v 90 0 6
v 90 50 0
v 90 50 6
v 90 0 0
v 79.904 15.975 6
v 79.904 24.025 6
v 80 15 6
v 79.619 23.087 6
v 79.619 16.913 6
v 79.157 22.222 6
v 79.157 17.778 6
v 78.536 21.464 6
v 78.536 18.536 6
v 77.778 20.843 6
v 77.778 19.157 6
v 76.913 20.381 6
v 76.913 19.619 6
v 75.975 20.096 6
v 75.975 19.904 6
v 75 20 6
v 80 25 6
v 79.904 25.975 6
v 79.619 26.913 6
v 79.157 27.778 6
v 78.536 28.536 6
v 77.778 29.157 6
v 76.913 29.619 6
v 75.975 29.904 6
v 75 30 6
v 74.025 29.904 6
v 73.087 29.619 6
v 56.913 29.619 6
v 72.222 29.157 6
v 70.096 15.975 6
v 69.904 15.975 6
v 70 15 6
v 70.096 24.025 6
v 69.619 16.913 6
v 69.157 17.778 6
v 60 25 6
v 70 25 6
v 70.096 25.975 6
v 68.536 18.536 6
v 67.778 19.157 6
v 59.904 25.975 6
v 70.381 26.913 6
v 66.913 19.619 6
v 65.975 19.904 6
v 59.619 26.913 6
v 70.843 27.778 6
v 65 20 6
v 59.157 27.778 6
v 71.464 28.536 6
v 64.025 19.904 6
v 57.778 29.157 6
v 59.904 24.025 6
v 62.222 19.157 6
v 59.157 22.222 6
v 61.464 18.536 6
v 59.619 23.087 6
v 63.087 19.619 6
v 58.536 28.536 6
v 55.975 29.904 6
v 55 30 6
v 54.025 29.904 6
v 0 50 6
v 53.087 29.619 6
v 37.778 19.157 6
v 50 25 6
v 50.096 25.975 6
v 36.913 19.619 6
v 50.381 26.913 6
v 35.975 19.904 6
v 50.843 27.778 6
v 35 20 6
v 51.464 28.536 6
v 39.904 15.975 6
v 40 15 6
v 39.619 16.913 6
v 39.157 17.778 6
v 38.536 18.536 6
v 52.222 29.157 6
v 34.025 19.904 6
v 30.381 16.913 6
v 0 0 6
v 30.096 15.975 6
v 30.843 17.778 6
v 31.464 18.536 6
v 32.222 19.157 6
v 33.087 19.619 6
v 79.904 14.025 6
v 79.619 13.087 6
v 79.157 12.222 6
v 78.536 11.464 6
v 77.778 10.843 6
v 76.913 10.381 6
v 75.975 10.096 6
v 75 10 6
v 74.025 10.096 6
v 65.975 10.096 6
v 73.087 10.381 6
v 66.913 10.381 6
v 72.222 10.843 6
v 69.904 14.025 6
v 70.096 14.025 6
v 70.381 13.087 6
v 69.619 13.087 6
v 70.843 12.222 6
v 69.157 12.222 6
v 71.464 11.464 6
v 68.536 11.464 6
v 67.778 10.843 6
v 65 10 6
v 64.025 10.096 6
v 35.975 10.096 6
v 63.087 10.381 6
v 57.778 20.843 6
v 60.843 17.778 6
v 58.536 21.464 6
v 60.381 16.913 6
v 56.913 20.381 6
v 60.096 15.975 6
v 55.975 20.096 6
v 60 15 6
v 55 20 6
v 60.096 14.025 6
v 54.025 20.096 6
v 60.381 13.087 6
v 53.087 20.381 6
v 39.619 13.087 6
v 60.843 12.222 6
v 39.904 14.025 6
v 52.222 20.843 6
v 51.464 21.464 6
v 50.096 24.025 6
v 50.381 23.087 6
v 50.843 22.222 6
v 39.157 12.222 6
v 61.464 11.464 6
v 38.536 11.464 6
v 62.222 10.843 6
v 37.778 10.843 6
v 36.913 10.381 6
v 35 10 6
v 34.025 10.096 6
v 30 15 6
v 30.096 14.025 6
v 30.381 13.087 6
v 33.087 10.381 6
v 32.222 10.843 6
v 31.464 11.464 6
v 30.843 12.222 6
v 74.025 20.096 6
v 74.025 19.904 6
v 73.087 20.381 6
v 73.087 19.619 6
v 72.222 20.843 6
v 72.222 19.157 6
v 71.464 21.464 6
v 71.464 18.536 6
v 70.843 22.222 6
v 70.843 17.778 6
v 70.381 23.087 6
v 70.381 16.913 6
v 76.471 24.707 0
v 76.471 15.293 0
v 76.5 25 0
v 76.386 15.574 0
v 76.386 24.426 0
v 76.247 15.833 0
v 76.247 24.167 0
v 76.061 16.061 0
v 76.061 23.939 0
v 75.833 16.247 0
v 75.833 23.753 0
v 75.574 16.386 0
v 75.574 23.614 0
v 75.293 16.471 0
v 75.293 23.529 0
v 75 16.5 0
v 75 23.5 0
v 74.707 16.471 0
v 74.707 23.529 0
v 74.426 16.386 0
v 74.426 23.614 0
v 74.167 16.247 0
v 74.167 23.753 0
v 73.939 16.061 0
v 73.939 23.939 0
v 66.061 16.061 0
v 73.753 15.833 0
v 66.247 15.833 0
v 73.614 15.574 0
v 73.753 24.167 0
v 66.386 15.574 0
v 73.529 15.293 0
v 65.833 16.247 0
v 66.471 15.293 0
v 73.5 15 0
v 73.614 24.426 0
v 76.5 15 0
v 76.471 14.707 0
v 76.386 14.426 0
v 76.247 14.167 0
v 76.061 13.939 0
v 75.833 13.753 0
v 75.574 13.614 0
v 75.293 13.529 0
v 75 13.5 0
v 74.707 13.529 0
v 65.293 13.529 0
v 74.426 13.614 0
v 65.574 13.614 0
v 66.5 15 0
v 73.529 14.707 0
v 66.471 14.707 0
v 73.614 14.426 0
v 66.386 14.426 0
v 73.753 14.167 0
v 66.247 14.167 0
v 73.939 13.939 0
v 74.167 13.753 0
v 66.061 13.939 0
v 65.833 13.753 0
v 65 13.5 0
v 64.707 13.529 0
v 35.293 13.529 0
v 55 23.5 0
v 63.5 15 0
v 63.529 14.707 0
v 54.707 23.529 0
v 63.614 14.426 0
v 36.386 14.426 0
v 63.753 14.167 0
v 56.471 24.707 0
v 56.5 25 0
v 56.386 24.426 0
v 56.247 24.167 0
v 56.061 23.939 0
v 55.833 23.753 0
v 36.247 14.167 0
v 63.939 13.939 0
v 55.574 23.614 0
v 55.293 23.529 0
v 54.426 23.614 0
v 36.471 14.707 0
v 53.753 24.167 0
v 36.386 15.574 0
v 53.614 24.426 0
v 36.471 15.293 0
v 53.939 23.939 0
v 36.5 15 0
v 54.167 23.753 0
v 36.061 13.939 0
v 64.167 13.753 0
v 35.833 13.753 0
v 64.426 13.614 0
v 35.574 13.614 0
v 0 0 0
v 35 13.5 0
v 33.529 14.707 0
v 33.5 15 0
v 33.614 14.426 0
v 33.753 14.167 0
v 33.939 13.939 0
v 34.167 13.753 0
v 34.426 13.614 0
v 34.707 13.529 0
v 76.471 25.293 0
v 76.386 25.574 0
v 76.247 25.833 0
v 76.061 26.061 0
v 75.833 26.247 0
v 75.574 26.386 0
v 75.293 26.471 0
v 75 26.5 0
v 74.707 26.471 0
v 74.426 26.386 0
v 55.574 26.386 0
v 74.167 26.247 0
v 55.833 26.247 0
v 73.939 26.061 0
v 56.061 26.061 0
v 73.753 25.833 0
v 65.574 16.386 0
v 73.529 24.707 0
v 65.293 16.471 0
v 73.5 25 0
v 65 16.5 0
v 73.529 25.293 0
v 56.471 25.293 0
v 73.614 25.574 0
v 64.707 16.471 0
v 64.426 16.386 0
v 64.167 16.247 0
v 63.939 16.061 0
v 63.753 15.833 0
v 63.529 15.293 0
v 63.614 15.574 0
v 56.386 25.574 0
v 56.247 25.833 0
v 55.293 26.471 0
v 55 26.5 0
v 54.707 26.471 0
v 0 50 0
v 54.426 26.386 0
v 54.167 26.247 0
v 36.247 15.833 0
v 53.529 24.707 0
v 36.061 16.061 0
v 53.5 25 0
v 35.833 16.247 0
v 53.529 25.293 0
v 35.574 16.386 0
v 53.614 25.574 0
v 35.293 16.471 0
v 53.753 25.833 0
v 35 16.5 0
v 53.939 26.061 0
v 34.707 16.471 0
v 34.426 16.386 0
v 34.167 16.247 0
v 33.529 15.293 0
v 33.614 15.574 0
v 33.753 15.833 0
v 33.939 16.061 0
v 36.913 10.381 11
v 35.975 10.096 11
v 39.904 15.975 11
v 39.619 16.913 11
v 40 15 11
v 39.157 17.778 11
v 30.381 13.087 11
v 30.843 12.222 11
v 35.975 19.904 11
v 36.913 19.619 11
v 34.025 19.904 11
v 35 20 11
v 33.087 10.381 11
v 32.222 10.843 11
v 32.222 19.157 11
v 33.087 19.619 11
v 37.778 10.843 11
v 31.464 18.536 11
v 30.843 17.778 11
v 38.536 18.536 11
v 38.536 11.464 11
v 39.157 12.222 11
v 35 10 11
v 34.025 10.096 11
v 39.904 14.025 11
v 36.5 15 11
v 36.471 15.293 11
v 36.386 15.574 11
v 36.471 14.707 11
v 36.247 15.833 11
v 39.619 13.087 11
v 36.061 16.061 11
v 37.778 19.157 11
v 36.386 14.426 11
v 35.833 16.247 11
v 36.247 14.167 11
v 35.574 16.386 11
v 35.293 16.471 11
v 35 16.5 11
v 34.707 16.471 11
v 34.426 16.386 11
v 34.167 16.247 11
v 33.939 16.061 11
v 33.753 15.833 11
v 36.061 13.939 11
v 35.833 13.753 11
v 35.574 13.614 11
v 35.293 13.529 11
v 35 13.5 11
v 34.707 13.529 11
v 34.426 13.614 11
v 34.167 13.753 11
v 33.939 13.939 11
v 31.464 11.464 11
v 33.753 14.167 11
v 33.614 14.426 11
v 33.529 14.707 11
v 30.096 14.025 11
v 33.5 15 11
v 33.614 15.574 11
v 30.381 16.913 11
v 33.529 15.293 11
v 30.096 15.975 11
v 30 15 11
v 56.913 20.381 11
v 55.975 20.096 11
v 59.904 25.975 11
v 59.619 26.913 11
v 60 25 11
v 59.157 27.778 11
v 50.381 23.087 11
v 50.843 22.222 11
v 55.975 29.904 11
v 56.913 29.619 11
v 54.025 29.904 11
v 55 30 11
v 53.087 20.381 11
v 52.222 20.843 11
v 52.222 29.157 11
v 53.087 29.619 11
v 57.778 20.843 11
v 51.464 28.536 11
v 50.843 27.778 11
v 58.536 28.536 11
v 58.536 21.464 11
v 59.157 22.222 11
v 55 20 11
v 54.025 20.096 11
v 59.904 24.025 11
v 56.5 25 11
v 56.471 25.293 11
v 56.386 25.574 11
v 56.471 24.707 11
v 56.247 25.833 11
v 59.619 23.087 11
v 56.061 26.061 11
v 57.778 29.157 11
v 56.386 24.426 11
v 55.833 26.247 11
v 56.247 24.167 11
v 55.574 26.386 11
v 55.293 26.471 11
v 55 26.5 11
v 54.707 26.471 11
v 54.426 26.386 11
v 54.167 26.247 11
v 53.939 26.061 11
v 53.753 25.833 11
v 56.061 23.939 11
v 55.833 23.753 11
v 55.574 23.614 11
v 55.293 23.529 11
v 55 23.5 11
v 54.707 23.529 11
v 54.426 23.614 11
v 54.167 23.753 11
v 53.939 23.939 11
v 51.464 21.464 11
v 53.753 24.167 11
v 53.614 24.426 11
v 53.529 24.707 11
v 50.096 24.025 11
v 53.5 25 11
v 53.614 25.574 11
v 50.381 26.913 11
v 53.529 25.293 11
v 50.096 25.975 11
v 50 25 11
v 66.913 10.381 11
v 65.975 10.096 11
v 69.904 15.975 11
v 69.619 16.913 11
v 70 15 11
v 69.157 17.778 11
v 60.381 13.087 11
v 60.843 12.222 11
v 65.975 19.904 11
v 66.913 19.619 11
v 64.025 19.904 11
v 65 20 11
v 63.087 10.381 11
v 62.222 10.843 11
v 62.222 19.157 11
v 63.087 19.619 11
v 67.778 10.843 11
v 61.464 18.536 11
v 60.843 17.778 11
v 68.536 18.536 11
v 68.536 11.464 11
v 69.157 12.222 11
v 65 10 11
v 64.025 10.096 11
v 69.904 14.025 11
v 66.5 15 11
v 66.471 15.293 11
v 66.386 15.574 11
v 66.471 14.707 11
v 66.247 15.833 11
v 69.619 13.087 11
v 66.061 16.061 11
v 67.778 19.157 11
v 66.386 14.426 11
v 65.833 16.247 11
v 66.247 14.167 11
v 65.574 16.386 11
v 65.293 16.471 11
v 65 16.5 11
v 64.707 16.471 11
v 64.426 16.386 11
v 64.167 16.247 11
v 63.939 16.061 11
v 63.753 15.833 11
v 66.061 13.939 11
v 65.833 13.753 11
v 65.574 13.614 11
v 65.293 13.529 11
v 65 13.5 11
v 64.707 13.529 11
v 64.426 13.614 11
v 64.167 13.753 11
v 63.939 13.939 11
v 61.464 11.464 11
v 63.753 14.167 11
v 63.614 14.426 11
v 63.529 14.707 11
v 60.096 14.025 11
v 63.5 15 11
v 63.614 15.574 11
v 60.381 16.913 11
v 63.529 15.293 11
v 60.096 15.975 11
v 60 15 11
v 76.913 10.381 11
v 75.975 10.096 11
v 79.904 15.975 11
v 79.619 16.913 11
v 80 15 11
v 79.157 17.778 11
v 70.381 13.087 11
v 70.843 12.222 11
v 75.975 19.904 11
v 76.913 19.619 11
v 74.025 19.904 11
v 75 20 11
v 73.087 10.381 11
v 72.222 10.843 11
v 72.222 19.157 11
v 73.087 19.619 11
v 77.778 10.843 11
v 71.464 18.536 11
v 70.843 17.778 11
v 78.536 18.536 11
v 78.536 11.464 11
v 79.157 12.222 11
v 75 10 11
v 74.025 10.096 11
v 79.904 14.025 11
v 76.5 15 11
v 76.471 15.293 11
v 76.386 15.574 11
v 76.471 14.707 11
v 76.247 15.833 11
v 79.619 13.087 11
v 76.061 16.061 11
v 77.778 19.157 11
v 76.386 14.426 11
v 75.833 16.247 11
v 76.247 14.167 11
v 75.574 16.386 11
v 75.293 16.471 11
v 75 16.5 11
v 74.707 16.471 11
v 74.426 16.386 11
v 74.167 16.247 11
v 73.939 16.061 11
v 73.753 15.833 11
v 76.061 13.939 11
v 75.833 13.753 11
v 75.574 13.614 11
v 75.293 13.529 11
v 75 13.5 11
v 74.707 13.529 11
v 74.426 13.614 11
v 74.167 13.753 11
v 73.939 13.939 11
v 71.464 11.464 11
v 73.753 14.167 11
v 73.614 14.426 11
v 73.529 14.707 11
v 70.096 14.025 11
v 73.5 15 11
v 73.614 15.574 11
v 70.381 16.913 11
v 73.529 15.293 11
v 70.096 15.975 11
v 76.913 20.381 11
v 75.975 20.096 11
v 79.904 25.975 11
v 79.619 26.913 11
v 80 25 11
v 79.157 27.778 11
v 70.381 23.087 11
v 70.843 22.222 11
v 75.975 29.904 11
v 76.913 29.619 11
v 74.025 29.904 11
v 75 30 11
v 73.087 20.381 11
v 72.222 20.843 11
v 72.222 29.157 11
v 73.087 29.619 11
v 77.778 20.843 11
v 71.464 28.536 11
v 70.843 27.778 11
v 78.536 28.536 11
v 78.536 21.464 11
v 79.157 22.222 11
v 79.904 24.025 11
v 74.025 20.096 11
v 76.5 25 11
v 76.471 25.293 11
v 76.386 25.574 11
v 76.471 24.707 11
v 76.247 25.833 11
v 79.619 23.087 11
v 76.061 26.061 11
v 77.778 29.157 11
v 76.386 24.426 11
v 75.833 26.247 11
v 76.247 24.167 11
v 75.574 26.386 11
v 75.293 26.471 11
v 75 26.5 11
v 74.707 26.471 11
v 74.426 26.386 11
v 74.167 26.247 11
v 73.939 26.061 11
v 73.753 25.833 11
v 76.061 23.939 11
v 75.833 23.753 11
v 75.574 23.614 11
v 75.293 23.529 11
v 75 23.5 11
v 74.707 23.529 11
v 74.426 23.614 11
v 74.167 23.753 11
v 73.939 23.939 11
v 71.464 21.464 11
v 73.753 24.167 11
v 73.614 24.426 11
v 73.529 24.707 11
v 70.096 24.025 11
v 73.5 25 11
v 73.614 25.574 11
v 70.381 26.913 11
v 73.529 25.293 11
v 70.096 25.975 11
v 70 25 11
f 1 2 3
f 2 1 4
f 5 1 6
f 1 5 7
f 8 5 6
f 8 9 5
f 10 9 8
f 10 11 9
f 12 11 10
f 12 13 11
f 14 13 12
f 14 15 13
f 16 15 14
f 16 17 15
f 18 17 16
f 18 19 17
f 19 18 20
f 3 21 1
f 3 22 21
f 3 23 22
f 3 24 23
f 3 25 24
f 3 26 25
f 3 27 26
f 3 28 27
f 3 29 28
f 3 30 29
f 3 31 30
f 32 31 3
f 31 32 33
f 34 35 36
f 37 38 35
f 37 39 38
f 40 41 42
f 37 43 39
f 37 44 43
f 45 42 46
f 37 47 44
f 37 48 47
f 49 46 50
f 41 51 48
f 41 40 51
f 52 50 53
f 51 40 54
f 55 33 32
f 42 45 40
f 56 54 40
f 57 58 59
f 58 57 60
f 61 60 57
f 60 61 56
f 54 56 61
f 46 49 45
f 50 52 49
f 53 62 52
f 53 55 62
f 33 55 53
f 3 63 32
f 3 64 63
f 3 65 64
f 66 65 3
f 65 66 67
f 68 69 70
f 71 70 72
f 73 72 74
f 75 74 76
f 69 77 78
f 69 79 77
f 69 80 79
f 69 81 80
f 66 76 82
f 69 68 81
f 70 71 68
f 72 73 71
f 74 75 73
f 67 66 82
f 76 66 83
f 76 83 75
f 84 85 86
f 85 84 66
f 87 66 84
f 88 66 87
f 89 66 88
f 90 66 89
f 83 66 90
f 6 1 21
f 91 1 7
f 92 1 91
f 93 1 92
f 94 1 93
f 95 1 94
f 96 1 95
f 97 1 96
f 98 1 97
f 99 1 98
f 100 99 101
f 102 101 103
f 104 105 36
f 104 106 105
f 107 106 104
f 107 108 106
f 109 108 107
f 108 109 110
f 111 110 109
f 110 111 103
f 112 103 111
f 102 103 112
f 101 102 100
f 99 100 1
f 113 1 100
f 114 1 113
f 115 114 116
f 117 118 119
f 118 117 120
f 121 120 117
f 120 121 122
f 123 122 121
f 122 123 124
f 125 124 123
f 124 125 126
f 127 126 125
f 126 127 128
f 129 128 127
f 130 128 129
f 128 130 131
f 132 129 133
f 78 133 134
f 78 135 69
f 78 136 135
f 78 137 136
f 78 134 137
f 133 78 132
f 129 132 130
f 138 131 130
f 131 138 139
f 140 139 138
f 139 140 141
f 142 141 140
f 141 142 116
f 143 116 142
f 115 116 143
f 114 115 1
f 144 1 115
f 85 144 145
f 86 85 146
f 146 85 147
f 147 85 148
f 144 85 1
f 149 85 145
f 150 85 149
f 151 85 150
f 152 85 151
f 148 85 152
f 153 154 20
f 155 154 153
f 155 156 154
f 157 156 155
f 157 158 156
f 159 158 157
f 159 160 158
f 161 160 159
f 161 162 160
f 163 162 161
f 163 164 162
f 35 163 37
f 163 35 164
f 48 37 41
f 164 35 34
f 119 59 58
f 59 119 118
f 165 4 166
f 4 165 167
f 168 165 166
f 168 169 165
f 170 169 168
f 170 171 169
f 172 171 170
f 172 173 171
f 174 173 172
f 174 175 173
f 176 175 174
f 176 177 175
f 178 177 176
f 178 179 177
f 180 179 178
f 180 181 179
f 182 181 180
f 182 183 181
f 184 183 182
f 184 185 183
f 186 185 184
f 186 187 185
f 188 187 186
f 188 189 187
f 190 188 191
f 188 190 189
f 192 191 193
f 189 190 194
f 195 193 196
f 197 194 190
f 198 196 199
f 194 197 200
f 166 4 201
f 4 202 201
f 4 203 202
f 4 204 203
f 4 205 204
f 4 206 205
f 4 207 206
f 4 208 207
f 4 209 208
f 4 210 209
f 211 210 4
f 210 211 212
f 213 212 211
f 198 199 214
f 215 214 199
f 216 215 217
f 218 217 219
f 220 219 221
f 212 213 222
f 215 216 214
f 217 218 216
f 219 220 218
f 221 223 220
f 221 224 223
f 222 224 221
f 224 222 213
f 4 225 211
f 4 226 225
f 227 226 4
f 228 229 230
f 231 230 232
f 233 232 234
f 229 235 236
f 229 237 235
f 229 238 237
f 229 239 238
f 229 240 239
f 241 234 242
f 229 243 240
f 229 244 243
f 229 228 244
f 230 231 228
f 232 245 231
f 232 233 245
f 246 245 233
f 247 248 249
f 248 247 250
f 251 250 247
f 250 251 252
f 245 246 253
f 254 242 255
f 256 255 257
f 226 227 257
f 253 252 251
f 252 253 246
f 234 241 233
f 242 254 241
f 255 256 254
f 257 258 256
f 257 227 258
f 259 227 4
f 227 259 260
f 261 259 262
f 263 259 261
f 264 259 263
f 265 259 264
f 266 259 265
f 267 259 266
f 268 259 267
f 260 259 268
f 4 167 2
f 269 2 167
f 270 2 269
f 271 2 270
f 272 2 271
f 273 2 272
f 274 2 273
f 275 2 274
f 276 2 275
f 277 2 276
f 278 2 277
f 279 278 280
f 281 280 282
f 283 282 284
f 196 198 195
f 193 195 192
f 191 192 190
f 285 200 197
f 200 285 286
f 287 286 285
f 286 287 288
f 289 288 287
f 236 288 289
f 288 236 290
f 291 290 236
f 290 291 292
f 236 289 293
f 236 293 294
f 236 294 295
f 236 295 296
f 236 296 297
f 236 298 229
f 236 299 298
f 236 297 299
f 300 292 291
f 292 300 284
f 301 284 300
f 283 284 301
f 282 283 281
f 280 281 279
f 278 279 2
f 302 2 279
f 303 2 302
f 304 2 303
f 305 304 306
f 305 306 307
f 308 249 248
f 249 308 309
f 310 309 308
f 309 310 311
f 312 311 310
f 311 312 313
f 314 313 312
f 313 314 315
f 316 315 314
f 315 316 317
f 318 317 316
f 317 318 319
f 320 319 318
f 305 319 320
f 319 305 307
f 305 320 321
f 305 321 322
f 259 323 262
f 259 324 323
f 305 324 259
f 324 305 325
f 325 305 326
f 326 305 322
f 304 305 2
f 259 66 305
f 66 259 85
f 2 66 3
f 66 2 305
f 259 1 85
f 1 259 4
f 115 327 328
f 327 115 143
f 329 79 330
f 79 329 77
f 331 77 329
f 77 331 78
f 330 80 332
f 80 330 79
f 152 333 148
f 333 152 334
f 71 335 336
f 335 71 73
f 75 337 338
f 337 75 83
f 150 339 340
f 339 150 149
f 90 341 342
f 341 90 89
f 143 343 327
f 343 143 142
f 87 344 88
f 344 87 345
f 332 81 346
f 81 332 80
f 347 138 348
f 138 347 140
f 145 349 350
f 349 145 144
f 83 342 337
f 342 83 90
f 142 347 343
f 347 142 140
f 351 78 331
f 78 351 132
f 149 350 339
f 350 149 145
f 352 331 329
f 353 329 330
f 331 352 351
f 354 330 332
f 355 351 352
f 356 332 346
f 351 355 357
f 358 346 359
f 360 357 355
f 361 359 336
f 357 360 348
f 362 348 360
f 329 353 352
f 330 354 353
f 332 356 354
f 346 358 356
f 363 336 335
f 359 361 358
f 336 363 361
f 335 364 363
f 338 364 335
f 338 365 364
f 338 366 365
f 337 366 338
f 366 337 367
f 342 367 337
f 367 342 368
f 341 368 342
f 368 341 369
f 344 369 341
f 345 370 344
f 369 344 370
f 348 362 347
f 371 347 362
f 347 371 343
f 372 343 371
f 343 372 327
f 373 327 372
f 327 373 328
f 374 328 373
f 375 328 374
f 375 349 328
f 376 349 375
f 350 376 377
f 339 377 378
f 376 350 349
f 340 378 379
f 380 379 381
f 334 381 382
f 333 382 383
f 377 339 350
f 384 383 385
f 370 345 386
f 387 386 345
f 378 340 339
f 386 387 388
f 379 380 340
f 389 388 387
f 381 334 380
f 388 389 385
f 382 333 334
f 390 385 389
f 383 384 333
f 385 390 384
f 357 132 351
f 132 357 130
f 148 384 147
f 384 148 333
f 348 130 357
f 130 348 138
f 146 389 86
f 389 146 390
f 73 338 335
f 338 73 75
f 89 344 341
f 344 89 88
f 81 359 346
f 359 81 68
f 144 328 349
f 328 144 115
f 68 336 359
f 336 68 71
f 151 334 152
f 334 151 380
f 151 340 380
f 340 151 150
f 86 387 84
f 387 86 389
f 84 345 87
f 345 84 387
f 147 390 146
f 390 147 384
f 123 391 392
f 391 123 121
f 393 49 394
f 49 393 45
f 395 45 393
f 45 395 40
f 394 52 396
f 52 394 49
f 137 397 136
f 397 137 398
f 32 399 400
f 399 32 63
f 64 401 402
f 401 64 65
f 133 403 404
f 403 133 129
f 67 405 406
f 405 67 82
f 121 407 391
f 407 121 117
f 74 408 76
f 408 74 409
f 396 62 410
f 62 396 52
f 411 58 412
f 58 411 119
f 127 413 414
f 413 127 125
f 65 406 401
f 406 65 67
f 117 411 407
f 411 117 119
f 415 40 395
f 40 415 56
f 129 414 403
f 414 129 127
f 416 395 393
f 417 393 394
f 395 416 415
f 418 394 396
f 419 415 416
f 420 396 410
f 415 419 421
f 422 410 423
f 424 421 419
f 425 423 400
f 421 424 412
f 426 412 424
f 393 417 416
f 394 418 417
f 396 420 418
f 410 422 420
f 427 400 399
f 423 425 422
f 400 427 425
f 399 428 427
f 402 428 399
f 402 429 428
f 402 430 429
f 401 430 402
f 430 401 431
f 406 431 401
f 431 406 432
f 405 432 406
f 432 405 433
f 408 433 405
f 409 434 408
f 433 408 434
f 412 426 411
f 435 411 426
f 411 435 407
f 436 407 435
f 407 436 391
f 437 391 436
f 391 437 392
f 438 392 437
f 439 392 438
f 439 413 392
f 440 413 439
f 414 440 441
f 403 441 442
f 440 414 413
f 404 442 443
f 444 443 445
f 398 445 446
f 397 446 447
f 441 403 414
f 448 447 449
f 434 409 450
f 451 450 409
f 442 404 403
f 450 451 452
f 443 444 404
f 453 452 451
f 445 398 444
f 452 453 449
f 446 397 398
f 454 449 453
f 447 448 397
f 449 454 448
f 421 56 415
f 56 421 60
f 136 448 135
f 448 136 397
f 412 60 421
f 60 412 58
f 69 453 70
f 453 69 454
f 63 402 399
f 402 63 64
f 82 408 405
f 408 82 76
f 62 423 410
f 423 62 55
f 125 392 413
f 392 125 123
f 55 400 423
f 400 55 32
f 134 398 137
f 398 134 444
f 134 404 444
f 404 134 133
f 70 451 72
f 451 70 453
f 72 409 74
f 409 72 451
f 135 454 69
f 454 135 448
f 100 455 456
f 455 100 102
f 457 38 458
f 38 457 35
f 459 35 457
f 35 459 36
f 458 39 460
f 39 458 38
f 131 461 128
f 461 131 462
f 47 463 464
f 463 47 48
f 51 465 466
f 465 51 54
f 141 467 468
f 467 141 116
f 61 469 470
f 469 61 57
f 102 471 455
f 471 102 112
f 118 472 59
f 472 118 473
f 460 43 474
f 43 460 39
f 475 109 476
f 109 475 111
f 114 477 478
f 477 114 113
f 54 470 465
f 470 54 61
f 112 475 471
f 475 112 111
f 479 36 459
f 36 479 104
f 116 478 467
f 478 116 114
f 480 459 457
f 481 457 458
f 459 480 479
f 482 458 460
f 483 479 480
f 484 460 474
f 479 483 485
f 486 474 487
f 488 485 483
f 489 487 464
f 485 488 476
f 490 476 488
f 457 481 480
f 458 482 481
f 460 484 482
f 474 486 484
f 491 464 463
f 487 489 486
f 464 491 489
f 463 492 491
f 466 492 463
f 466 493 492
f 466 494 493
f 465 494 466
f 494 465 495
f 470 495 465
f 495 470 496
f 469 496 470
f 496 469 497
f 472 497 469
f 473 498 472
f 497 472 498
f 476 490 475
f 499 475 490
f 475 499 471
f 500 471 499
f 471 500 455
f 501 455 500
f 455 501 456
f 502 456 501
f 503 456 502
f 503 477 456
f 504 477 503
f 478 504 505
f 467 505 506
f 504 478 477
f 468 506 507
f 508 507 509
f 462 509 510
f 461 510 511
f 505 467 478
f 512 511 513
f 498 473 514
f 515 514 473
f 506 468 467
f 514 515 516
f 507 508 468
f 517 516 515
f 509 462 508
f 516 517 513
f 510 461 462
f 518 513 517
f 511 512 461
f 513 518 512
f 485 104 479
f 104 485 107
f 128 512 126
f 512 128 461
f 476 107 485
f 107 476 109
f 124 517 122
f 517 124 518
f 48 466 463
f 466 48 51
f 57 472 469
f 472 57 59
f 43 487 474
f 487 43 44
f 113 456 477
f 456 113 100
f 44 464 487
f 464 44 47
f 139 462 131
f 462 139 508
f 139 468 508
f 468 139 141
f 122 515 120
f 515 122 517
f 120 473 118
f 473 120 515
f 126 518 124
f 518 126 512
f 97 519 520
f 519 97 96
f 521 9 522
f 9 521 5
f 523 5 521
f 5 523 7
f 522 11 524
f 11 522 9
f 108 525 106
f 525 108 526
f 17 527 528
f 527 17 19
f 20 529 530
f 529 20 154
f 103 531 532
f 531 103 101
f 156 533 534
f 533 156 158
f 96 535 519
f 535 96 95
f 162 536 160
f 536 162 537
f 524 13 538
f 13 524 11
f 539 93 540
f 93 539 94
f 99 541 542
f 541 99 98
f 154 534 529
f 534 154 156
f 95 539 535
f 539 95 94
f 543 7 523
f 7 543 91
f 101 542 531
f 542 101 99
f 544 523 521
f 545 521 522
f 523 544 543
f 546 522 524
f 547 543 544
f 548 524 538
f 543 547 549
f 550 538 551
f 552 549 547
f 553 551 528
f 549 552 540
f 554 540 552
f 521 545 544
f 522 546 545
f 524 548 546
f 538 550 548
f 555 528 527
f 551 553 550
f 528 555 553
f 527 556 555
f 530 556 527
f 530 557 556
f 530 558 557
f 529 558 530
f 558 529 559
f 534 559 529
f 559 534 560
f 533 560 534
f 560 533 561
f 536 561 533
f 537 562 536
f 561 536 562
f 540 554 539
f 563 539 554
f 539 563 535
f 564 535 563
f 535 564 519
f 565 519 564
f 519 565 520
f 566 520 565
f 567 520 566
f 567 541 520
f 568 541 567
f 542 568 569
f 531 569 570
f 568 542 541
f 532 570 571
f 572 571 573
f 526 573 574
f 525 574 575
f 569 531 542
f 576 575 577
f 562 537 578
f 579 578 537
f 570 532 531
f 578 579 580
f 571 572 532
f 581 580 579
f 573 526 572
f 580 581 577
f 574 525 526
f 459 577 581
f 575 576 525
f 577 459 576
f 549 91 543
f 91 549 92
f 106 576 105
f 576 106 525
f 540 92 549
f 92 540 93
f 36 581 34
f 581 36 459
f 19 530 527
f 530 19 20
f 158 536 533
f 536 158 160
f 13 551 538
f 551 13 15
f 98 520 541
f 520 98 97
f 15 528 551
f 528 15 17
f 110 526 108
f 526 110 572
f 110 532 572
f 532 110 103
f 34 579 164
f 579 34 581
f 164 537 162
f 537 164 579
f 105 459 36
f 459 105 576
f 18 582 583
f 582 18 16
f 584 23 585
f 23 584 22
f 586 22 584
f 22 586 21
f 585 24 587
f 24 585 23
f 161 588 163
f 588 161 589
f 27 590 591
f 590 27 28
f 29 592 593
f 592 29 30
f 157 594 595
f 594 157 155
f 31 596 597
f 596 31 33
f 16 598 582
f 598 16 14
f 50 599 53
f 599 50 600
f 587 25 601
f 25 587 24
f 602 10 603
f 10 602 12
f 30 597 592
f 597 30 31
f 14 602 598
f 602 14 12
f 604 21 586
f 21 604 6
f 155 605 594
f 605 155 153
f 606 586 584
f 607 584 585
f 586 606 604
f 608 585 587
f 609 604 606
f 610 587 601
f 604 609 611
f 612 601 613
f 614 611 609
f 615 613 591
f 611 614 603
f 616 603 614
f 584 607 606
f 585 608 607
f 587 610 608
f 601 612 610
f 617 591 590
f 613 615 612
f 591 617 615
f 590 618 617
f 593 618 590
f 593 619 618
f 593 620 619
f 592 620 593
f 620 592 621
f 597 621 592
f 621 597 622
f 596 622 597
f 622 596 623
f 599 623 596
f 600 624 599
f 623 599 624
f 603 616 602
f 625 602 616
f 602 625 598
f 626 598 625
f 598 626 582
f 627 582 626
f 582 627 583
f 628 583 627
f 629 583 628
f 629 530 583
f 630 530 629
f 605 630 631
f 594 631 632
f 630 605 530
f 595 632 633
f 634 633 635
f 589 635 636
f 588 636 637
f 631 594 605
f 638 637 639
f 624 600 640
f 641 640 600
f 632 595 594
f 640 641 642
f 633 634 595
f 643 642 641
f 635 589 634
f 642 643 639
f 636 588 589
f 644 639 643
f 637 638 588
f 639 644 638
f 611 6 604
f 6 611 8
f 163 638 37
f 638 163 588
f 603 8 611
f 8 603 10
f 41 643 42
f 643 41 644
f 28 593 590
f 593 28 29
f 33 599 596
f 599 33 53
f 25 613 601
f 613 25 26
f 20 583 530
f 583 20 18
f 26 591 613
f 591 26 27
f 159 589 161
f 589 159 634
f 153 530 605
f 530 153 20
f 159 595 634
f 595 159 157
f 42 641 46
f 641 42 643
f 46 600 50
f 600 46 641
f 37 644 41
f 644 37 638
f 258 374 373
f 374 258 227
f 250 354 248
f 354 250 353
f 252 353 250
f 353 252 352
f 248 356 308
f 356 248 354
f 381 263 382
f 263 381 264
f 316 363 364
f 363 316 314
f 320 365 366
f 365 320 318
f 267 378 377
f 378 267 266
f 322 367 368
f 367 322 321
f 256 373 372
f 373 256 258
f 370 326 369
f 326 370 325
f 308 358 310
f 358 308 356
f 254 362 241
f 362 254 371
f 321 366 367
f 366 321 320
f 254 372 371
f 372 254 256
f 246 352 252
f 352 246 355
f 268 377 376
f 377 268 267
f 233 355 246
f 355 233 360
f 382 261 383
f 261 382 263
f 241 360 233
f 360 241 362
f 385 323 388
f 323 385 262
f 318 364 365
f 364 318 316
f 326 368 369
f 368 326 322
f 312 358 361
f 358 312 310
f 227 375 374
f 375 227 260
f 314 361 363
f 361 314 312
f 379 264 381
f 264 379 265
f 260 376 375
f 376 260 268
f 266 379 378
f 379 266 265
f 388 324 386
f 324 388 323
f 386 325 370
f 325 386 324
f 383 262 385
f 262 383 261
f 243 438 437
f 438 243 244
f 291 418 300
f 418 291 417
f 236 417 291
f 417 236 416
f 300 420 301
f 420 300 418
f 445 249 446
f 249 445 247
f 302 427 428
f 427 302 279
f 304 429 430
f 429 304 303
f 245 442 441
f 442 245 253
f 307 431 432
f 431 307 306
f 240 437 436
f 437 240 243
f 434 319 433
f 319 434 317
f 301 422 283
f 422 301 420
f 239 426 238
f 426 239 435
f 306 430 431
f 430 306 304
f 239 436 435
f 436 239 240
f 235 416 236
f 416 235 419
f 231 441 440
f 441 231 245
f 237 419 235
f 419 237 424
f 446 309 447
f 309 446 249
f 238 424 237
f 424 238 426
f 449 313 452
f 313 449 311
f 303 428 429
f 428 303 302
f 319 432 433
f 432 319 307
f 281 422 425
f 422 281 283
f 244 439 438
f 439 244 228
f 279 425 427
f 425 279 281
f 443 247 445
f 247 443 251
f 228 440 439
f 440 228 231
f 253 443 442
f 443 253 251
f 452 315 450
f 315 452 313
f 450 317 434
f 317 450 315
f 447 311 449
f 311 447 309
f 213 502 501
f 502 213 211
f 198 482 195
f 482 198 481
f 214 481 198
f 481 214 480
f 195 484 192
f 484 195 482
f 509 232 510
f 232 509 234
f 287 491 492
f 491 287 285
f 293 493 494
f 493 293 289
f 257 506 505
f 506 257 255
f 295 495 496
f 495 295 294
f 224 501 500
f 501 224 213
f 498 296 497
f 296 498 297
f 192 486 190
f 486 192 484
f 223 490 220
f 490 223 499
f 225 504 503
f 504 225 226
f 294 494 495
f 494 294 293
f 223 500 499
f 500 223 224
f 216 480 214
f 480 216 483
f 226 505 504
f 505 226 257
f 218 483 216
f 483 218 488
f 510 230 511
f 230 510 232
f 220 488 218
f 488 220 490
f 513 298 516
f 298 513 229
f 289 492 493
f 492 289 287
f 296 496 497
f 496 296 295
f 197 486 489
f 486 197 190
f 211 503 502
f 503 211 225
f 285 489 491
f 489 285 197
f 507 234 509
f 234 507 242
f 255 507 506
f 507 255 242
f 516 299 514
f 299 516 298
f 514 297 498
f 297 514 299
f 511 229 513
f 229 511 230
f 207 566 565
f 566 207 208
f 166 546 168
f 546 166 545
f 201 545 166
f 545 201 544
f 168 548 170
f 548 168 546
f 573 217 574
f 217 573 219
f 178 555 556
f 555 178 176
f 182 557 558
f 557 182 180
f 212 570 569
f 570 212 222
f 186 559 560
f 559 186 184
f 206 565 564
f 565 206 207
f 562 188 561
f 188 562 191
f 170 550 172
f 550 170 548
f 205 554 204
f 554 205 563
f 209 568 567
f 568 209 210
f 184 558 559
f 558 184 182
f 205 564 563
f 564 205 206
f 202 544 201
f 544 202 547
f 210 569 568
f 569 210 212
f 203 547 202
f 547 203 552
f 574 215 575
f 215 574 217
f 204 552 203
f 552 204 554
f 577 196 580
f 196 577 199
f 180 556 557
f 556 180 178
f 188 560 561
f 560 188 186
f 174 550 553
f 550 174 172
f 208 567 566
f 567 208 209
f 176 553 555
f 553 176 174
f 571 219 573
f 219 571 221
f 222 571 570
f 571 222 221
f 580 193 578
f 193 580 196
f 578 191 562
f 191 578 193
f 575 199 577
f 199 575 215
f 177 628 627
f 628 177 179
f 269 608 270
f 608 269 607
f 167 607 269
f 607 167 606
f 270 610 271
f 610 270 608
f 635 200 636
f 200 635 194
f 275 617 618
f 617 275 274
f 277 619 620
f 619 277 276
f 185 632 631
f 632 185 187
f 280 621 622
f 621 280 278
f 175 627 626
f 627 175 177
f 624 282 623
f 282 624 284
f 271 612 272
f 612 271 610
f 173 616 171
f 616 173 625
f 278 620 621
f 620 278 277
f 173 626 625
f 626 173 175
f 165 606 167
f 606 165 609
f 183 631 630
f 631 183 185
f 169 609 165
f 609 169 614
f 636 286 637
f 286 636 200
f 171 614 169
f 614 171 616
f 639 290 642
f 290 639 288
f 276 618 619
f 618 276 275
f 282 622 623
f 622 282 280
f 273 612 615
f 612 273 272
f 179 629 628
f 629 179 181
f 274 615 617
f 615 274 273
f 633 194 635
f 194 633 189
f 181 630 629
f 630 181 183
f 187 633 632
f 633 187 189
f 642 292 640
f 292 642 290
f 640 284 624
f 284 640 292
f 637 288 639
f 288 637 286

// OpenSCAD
$fn = 32;

// ----------------------------------------------------------------------
// Boss field: plate with bosses at given coordinates
// ----------------------------------------------------------------------

// --- parameters (mm) ---
plate_l = 90;             // plate length, X
plate_w = 50;             // plate width, Y
plate_t = 6;              // plate thickness, Z
boss_d = 10;              // boss diameter
boss_h = 5;               // boss height above the plate
bore_d = 3;               // boss bore
fit_tol = 0.05;           // tolerance for press fits, mm
free_tol = 0.3;           // tolerance for clearance fits, mm

total_h = plate_t + boss_h;  // overall height

difference() {
  union() {
    cube([plate_l, plate_w, plate_t]);
    translate([35, 15, plate_t]) cylinder(h = boss_h, d = boss_d);
    translate([55, 25, plate_t]) cylinder(h = boss_h, d = boss_d);
    translate([65, 15, plate_t]) cylinder(h = boss_h, d = boss_d);
    translate([75, 15, plate_t]) cylinder(h = boss_h, d = boss_d);
    translate([75, 25, plate_t]) cylinder(h = boss_h, d = boss_d);
  }
  translate([35, 15, -1]) cylinder(h = total_h + 2, d = bore_d);
  translate([55, 25, -1]) cylinder(h = total_h + 2, d = bore_d);
  translate([65, 15, -1]) cylinder(h = total_h + 2, d = bore_d);
  translate([75, 15, -1]) cylinder(h = total_h + 2, d = bore_d);
  translate([75, 25, -1]) cylinder(h = total_h + 2, d = bore_d);
}
